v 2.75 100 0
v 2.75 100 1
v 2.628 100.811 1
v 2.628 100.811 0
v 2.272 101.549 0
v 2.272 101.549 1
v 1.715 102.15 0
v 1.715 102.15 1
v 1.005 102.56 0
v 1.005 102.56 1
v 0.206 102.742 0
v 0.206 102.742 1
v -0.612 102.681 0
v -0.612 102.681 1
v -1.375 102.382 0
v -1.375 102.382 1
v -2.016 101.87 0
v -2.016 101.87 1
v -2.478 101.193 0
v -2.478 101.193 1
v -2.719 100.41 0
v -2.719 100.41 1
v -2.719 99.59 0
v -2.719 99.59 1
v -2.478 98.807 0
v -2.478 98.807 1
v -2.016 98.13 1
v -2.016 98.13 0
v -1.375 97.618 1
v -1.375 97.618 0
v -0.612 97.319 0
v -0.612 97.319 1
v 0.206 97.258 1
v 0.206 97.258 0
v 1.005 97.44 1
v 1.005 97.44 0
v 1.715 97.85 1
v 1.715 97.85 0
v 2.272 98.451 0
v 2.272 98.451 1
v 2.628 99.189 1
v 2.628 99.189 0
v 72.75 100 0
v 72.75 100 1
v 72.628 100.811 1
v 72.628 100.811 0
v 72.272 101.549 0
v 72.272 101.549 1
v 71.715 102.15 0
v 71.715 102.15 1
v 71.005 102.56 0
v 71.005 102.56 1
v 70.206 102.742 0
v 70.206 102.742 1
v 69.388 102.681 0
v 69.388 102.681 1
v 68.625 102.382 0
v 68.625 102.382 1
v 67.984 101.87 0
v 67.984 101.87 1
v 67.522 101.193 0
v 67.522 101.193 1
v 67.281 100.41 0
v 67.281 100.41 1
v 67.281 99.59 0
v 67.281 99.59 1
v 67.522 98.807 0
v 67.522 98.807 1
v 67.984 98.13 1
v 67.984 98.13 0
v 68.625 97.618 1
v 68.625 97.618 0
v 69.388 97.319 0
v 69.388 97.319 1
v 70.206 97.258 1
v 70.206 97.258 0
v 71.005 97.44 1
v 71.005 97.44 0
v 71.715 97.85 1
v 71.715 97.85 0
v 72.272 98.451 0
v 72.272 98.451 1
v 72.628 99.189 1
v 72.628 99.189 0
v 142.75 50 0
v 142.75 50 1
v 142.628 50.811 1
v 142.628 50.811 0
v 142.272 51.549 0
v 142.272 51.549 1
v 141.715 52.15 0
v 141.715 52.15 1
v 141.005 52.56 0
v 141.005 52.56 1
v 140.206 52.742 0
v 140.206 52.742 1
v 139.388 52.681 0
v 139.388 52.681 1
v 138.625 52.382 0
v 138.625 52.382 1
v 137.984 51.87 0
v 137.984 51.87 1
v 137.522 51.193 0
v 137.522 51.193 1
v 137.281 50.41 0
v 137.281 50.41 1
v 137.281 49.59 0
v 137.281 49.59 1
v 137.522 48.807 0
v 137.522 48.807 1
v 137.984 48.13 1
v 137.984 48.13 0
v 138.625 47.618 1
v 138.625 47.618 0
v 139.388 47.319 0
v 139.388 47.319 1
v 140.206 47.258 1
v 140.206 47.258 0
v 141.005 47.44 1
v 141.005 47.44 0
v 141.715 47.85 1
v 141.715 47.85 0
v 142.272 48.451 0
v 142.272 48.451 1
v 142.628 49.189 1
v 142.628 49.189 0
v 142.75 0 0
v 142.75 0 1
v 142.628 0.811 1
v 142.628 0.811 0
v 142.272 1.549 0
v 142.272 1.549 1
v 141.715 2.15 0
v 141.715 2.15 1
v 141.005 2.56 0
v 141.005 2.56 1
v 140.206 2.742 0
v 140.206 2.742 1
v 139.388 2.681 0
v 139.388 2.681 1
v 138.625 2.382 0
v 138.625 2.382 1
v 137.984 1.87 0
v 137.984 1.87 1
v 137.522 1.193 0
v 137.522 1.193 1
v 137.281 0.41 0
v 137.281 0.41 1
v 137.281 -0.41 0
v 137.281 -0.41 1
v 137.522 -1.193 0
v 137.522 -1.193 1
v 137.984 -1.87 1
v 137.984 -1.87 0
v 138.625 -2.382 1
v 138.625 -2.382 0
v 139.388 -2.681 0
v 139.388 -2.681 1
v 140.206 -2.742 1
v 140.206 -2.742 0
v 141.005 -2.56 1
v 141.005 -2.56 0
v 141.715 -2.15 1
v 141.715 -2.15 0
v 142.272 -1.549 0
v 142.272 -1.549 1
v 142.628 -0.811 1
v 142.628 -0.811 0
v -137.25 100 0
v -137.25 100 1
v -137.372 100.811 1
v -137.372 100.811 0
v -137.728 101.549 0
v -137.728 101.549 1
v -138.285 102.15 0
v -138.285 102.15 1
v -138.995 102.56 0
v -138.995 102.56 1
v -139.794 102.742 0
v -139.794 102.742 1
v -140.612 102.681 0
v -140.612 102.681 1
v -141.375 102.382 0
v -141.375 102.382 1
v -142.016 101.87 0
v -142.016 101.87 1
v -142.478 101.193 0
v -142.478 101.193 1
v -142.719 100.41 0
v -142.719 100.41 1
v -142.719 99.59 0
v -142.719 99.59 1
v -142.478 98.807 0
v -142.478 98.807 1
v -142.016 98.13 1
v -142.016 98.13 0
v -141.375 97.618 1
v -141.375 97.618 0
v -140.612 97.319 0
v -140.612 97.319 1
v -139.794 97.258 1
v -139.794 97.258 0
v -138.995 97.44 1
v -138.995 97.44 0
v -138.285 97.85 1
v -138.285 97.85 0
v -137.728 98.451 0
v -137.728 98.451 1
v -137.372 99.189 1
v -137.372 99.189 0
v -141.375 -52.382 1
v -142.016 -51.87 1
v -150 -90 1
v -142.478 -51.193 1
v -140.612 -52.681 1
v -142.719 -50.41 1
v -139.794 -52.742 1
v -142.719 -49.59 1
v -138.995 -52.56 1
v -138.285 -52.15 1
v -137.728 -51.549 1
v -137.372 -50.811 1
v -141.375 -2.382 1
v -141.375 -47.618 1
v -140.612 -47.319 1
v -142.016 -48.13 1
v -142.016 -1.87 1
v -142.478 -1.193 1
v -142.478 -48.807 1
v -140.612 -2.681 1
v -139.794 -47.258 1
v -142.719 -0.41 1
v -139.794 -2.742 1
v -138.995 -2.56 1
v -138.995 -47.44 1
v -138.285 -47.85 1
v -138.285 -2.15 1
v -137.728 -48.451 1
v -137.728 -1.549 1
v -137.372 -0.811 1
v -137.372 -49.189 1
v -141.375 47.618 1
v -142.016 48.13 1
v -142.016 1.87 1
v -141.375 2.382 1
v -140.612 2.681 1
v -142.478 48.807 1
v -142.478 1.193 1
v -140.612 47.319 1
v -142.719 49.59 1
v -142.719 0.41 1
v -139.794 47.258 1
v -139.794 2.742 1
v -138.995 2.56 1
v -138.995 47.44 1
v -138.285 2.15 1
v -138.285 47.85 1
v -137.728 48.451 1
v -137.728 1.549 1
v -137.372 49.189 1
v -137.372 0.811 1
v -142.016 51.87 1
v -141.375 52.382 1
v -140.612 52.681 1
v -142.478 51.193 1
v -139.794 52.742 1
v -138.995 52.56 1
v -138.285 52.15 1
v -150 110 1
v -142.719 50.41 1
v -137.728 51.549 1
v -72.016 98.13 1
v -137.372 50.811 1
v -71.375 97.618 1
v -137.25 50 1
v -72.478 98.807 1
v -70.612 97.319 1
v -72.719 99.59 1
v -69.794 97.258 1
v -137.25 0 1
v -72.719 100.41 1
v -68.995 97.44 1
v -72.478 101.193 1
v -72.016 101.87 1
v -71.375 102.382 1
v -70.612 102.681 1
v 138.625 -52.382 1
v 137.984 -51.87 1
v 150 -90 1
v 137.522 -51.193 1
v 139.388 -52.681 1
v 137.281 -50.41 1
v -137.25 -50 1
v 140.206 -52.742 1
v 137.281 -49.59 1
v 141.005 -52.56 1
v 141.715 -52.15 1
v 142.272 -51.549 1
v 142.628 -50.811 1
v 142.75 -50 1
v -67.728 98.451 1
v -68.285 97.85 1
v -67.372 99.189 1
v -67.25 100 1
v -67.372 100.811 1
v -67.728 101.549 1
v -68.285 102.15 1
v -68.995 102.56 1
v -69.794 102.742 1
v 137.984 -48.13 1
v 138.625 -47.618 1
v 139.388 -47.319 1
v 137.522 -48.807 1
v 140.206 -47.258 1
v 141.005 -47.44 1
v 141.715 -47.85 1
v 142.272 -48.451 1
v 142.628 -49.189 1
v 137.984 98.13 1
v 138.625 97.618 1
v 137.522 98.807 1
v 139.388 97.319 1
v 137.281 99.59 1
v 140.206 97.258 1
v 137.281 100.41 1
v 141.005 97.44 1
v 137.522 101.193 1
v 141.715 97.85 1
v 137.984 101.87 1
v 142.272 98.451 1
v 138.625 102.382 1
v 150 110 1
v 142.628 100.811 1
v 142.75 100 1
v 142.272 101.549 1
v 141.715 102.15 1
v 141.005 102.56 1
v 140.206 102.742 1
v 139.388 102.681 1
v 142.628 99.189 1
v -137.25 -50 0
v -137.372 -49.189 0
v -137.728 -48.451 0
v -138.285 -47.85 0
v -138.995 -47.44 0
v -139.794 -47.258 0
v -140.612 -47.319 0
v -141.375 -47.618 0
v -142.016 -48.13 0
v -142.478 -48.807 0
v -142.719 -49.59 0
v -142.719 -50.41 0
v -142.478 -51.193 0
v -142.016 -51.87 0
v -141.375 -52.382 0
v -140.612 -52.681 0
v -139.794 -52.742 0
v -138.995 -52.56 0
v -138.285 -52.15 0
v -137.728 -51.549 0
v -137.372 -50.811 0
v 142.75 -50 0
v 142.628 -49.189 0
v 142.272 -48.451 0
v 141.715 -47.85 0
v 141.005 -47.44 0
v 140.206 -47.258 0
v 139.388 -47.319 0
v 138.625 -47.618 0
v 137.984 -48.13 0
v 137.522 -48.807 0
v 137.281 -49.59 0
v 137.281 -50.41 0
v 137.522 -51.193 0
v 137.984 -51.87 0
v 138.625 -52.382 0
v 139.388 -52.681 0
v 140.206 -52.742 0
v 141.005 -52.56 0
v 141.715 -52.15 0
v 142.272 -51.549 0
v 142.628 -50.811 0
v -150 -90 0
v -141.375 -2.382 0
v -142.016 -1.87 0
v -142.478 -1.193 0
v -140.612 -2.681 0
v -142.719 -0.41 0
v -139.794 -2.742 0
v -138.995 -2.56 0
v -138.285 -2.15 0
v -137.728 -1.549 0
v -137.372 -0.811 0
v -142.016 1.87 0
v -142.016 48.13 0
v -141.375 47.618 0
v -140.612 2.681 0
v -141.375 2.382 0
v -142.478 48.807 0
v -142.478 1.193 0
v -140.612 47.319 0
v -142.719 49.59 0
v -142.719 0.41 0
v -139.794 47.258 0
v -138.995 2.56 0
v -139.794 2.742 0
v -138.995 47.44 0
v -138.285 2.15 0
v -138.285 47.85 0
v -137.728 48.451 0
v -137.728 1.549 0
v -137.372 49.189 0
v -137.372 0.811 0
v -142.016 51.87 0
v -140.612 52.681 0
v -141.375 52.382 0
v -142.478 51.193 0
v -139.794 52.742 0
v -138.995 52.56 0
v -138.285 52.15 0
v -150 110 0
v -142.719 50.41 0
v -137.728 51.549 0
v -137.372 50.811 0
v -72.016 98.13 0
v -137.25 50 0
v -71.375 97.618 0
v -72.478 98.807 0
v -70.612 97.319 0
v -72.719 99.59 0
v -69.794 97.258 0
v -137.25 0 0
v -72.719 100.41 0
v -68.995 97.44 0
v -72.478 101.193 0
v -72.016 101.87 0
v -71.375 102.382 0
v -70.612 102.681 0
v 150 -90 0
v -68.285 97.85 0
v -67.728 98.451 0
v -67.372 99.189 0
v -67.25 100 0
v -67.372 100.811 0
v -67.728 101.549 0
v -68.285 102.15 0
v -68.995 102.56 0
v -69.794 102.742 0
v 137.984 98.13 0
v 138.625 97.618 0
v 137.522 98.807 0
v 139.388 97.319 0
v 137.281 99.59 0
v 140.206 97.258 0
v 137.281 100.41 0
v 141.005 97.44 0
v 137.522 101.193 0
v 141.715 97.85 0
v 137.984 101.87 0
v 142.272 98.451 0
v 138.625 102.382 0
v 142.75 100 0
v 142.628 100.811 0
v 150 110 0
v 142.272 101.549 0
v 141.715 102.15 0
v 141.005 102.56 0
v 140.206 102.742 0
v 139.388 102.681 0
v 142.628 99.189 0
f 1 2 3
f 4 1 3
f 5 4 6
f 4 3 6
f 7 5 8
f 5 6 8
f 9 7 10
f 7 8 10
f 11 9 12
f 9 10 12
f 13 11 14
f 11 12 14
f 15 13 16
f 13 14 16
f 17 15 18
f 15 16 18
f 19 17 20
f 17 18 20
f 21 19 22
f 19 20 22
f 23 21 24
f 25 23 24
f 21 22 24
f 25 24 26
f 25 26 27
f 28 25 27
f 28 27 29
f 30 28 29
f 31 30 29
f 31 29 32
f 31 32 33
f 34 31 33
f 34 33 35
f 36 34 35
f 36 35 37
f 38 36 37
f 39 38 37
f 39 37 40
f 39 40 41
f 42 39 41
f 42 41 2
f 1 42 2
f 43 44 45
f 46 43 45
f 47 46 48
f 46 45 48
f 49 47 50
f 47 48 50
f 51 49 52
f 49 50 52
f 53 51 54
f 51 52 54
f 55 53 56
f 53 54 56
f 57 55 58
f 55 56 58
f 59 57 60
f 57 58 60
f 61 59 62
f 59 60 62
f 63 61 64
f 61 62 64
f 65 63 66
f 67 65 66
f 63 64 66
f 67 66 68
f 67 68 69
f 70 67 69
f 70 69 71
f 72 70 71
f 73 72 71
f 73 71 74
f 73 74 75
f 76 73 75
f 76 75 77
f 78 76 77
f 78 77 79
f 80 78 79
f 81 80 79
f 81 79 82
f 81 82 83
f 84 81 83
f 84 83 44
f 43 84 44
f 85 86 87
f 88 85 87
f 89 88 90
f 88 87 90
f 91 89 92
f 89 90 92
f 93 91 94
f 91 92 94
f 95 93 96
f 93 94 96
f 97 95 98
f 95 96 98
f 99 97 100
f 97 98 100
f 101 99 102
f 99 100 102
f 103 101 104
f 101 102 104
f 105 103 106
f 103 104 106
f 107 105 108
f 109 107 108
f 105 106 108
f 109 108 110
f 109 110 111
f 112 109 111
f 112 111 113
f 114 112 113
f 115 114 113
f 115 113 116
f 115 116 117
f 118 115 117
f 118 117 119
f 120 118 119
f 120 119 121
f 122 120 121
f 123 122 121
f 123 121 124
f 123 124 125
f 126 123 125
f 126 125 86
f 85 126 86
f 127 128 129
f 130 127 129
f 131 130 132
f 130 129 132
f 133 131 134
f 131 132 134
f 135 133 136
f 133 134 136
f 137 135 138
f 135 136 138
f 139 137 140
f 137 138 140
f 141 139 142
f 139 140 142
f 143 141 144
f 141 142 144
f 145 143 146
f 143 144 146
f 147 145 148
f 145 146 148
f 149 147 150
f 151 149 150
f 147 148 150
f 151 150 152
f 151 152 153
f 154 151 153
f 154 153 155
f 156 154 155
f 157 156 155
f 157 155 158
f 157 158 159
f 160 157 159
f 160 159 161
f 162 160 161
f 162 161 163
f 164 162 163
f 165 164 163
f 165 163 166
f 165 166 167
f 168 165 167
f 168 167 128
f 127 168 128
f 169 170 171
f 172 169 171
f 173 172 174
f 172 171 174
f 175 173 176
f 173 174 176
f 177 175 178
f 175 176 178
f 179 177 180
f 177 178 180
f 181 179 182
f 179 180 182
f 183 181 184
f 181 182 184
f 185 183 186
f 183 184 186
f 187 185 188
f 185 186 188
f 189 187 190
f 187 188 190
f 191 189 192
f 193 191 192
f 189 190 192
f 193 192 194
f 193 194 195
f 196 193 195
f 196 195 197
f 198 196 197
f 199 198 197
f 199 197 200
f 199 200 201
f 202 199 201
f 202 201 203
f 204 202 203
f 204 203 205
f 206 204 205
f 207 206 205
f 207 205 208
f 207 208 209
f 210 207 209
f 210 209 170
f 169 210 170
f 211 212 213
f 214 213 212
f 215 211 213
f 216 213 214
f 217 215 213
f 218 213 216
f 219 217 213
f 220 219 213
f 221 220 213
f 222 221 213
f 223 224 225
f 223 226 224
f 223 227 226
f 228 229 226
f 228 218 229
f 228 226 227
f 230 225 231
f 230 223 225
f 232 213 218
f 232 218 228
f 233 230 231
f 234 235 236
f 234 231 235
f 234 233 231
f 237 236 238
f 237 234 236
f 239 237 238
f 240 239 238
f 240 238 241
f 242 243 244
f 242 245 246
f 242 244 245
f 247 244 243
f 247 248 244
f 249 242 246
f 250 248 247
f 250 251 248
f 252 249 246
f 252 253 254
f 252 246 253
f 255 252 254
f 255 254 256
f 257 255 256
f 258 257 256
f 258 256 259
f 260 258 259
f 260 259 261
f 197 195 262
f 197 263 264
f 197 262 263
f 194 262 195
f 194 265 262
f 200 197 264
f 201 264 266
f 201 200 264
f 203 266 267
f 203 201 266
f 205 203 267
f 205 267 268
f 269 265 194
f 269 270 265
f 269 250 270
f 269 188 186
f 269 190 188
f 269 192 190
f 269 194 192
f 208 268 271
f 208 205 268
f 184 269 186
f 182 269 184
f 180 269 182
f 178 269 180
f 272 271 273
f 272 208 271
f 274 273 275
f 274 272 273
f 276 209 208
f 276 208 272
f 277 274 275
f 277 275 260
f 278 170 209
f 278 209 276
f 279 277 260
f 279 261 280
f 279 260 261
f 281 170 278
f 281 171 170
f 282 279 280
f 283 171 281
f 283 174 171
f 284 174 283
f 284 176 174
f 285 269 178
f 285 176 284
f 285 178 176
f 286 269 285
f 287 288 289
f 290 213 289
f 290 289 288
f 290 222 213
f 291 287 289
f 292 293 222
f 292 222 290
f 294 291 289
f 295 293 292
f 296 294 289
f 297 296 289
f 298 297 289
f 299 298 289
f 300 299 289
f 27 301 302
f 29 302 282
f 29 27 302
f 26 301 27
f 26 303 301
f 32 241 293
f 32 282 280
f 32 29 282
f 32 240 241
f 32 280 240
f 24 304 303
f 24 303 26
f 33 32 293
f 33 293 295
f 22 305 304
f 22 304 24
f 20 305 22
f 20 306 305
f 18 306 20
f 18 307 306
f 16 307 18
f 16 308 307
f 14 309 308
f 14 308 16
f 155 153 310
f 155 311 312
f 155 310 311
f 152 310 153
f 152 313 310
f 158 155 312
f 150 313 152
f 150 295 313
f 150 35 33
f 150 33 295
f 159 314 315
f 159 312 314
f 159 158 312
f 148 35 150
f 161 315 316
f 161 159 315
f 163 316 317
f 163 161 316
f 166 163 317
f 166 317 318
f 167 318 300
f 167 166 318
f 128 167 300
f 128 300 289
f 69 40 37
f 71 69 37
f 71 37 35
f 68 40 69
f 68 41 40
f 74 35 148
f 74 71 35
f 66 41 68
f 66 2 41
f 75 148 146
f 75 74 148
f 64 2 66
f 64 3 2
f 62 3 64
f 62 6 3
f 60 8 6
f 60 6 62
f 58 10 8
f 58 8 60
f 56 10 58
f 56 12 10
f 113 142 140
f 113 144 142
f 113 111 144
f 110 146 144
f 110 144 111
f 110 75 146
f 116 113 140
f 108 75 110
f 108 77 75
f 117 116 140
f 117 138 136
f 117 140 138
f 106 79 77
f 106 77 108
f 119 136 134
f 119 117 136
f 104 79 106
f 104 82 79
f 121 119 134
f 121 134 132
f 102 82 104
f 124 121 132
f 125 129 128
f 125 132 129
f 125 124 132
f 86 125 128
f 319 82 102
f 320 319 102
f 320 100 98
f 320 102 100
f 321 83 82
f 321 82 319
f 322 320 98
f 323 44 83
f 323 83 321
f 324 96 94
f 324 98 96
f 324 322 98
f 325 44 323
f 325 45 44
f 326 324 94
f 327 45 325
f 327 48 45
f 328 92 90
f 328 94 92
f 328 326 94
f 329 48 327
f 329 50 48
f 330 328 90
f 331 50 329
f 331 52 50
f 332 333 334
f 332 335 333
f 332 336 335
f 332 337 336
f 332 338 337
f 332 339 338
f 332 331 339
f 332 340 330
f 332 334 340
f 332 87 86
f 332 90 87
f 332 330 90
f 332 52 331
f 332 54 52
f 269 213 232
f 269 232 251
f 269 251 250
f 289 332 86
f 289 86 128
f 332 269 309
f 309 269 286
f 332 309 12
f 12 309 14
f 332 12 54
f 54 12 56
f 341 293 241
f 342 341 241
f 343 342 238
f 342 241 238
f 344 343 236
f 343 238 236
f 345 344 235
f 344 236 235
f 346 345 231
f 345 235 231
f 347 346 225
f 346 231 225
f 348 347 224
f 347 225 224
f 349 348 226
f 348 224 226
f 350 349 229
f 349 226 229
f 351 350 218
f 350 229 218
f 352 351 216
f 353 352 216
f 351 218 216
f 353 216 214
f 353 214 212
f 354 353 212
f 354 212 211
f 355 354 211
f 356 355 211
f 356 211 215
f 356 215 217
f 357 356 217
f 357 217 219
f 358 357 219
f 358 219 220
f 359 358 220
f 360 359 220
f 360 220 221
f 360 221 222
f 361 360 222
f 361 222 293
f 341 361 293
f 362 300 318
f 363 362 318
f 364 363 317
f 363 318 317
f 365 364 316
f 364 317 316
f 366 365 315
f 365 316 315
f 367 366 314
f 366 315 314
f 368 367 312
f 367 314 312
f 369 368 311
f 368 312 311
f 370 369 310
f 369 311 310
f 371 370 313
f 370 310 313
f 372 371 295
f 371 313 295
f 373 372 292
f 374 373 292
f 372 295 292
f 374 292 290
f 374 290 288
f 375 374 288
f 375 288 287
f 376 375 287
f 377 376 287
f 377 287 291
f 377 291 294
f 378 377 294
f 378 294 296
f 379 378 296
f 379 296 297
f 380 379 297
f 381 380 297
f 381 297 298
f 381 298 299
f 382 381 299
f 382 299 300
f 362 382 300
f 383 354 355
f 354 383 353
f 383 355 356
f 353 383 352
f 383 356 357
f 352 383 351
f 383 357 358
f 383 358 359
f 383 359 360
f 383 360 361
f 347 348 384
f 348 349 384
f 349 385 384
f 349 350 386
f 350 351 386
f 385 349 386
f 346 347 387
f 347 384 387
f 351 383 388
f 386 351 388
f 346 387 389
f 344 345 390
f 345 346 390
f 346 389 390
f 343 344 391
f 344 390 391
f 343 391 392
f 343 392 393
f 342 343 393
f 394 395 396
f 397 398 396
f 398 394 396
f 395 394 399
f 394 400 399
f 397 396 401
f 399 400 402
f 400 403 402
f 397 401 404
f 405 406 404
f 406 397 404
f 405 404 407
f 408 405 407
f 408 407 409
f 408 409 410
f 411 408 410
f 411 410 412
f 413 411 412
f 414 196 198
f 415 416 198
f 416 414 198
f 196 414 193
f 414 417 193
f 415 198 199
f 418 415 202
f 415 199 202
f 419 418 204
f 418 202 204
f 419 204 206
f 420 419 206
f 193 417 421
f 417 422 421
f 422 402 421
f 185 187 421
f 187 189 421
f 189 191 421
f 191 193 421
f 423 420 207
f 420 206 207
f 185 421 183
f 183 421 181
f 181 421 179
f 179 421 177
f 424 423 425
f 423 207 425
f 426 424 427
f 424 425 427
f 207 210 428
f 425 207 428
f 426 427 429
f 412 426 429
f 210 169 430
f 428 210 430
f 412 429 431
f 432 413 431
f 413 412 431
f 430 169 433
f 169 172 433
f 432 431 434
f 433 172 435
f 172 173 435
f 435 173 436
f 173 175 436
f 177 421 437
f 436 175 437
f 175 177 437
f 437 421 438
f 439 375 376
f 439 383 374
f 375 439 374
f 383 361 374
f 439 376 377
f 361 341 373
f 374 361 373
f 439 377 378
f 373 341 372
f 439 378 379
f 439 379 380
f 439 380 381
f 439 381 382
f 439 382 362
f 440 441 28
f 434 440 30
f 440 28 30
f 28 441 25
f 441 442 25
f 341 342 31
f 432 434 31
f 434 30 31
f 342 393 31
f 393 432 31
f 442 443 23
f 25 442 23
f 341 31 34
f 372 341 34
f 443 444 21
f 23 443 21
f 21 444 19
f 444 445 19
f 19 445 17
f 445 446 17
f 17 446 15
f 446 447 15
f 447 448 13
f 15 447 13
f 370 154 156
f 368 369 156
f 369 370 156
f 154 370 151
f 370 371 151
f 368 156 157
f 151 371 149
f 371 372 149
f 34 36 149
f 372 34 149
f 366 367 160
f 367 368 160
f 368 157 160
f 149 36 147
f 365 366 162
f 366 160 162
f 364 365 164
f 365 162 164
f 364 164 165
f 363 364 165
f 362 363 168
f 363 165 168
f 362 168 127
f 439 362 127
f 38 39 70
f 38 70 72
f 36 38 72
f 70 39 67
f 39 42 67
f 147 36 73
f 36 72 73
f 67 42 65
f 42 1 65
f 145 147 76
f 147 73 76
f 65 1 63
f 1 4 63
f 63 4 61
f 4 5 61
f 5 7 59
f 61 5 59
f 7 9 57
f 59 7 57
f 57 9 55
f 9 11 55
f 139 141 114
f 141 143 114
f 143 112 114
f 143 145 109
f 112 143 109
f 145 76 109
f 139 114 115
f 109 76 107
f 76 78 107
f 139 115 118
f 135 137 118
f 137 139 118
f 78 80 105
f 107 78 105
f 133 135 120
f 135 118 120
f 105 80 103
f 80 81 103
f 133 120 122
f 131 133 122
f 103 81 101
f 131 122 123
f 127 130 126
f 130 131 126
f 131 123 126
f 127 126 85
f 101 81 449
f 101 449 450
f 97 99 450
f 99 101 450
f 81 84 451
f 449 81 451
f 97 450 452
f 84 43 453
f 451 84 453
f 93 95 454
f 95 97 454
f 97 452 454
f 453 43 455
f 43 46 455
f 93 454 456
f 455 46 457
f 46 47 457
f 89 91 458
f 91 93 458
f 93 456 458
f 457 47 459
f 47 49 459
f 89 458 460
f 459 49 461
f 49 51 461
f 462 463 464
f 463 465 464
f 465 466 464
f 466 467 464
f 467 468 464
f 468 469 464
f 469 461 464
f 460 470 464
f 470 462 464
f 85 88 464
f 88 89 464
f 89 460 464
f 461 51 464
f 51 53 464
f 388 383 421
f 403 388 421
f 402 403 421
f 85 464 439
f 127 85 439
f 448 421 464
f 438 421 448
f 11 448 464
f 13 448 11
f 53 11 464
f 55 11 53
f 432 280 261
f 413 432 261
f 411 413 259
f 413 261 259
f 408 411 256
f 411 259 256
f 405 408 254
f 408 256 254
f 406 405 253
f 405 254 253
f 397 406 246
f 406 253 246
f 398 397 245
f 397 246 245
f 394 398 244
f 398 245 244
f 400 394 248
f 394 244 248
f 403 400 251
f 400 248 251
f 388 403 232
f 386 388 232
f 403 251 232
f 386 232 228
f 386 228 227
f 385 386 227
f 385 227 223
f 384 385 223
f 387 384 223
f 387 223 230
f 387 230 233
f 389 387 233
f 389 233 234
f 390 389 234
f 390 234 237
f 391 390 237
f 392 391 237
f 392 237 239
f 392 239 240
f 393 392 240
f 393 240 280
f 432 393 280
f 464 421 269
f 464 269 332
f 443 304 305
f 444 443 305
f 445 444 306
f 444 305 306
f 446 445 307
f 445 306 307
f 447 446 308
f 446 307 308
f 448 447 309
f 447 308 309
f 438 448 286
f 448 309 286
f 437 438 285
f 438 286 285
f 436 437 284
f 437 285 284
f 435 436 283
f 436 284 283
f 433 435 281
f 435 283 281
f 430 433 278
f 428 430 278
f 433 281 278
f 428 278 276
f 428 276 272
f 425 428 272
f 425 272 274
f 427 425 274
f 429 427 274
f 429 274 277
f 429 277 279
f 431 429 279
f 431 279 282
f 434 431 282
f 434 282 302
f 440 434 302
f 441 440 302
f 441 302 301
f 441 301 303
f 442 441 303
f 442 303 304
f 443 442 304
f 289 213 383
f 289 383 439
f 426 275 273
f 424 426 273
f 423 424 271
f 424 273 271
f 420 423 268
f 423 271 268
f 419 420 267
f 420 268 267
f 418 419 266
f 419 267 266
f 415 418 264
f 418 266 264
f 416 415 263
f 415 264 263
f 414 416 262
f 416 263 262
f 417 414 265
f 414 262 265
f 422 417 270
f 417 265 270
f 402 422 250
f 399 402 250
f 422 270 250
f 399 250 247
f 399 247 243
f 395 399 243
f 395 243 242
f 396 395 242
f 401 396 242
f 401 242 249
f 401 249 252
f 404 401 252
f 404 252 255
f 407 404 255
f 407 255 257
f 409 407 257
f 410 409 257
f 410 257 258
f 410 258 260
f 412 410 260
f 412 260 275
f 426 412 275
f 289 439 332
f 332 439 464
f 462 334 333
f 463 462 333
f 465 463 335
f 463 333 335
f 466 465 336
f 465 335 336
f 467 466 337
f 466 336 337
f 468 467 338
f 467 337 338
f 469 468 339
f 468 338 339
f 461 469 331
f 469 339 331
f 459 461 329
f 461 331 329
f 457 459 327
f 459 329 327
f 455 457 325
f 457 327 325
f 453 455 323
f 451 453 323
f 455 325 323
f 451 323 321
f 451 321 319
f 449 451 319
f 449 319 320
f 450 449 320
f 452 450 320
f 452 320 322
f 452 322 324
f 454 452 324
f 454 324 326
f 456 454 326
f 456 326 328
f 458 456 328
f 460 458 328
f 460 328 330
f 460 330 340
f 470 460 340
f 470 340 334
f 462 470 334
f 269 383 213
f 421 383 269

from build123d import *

# Parameters (mm, degrees)
SKETCH_1_W          = 300
SKETCH_1_H          = 220
EXTRUDE_1_DEPTH     = 1
HOLE_WIZARD_M5_1_D  = 5.5
SKETCH_4_W          = 300
SKETCH_4_H          = 20
CUT_EXTRUDE_1_DEPTH = 10


with BuildPart() as part:
    # 스케치1 → 보스-돌출1 (new body)
    with BuildSketch(Plane.XY):
        Rectangle(SKETCH_1_W, SKETCH_1_H)
    extrude(amount=EXTRUDE_1_DEPTH)

    # M5 여유 구멍1 (through all)
    with Locations(Plane(origin=(0, 0, 0), x_dir=(-1, 0, 0), z_dir=(0, 0, -1))):
        with Locations((-140, 100), (-70, 100), (70, 100), (0, 100), (140, 100), (140, 50), (140, -50), (140, 0), (140, -100), (-140, 50), (-140, -50), (-140, 0), (-140, -100), (-70, -100), (70, -100), (0, -100)):
            Hole(HOLE_WIZARD_M5_1_D / 2)

    # 스케치4 → 컷-돌출1 (cut)
    with BuildSketch(Plane.XY.offset(1)):
        with Locations((0, -100)):
            Rectangle(SKETCH_4_W, SKETCH_4_H)
    extrude(amount=-CUT_EXTRUDE_1_DEPTH, mode=Mode.SUBTRACT)


solid = part.part
